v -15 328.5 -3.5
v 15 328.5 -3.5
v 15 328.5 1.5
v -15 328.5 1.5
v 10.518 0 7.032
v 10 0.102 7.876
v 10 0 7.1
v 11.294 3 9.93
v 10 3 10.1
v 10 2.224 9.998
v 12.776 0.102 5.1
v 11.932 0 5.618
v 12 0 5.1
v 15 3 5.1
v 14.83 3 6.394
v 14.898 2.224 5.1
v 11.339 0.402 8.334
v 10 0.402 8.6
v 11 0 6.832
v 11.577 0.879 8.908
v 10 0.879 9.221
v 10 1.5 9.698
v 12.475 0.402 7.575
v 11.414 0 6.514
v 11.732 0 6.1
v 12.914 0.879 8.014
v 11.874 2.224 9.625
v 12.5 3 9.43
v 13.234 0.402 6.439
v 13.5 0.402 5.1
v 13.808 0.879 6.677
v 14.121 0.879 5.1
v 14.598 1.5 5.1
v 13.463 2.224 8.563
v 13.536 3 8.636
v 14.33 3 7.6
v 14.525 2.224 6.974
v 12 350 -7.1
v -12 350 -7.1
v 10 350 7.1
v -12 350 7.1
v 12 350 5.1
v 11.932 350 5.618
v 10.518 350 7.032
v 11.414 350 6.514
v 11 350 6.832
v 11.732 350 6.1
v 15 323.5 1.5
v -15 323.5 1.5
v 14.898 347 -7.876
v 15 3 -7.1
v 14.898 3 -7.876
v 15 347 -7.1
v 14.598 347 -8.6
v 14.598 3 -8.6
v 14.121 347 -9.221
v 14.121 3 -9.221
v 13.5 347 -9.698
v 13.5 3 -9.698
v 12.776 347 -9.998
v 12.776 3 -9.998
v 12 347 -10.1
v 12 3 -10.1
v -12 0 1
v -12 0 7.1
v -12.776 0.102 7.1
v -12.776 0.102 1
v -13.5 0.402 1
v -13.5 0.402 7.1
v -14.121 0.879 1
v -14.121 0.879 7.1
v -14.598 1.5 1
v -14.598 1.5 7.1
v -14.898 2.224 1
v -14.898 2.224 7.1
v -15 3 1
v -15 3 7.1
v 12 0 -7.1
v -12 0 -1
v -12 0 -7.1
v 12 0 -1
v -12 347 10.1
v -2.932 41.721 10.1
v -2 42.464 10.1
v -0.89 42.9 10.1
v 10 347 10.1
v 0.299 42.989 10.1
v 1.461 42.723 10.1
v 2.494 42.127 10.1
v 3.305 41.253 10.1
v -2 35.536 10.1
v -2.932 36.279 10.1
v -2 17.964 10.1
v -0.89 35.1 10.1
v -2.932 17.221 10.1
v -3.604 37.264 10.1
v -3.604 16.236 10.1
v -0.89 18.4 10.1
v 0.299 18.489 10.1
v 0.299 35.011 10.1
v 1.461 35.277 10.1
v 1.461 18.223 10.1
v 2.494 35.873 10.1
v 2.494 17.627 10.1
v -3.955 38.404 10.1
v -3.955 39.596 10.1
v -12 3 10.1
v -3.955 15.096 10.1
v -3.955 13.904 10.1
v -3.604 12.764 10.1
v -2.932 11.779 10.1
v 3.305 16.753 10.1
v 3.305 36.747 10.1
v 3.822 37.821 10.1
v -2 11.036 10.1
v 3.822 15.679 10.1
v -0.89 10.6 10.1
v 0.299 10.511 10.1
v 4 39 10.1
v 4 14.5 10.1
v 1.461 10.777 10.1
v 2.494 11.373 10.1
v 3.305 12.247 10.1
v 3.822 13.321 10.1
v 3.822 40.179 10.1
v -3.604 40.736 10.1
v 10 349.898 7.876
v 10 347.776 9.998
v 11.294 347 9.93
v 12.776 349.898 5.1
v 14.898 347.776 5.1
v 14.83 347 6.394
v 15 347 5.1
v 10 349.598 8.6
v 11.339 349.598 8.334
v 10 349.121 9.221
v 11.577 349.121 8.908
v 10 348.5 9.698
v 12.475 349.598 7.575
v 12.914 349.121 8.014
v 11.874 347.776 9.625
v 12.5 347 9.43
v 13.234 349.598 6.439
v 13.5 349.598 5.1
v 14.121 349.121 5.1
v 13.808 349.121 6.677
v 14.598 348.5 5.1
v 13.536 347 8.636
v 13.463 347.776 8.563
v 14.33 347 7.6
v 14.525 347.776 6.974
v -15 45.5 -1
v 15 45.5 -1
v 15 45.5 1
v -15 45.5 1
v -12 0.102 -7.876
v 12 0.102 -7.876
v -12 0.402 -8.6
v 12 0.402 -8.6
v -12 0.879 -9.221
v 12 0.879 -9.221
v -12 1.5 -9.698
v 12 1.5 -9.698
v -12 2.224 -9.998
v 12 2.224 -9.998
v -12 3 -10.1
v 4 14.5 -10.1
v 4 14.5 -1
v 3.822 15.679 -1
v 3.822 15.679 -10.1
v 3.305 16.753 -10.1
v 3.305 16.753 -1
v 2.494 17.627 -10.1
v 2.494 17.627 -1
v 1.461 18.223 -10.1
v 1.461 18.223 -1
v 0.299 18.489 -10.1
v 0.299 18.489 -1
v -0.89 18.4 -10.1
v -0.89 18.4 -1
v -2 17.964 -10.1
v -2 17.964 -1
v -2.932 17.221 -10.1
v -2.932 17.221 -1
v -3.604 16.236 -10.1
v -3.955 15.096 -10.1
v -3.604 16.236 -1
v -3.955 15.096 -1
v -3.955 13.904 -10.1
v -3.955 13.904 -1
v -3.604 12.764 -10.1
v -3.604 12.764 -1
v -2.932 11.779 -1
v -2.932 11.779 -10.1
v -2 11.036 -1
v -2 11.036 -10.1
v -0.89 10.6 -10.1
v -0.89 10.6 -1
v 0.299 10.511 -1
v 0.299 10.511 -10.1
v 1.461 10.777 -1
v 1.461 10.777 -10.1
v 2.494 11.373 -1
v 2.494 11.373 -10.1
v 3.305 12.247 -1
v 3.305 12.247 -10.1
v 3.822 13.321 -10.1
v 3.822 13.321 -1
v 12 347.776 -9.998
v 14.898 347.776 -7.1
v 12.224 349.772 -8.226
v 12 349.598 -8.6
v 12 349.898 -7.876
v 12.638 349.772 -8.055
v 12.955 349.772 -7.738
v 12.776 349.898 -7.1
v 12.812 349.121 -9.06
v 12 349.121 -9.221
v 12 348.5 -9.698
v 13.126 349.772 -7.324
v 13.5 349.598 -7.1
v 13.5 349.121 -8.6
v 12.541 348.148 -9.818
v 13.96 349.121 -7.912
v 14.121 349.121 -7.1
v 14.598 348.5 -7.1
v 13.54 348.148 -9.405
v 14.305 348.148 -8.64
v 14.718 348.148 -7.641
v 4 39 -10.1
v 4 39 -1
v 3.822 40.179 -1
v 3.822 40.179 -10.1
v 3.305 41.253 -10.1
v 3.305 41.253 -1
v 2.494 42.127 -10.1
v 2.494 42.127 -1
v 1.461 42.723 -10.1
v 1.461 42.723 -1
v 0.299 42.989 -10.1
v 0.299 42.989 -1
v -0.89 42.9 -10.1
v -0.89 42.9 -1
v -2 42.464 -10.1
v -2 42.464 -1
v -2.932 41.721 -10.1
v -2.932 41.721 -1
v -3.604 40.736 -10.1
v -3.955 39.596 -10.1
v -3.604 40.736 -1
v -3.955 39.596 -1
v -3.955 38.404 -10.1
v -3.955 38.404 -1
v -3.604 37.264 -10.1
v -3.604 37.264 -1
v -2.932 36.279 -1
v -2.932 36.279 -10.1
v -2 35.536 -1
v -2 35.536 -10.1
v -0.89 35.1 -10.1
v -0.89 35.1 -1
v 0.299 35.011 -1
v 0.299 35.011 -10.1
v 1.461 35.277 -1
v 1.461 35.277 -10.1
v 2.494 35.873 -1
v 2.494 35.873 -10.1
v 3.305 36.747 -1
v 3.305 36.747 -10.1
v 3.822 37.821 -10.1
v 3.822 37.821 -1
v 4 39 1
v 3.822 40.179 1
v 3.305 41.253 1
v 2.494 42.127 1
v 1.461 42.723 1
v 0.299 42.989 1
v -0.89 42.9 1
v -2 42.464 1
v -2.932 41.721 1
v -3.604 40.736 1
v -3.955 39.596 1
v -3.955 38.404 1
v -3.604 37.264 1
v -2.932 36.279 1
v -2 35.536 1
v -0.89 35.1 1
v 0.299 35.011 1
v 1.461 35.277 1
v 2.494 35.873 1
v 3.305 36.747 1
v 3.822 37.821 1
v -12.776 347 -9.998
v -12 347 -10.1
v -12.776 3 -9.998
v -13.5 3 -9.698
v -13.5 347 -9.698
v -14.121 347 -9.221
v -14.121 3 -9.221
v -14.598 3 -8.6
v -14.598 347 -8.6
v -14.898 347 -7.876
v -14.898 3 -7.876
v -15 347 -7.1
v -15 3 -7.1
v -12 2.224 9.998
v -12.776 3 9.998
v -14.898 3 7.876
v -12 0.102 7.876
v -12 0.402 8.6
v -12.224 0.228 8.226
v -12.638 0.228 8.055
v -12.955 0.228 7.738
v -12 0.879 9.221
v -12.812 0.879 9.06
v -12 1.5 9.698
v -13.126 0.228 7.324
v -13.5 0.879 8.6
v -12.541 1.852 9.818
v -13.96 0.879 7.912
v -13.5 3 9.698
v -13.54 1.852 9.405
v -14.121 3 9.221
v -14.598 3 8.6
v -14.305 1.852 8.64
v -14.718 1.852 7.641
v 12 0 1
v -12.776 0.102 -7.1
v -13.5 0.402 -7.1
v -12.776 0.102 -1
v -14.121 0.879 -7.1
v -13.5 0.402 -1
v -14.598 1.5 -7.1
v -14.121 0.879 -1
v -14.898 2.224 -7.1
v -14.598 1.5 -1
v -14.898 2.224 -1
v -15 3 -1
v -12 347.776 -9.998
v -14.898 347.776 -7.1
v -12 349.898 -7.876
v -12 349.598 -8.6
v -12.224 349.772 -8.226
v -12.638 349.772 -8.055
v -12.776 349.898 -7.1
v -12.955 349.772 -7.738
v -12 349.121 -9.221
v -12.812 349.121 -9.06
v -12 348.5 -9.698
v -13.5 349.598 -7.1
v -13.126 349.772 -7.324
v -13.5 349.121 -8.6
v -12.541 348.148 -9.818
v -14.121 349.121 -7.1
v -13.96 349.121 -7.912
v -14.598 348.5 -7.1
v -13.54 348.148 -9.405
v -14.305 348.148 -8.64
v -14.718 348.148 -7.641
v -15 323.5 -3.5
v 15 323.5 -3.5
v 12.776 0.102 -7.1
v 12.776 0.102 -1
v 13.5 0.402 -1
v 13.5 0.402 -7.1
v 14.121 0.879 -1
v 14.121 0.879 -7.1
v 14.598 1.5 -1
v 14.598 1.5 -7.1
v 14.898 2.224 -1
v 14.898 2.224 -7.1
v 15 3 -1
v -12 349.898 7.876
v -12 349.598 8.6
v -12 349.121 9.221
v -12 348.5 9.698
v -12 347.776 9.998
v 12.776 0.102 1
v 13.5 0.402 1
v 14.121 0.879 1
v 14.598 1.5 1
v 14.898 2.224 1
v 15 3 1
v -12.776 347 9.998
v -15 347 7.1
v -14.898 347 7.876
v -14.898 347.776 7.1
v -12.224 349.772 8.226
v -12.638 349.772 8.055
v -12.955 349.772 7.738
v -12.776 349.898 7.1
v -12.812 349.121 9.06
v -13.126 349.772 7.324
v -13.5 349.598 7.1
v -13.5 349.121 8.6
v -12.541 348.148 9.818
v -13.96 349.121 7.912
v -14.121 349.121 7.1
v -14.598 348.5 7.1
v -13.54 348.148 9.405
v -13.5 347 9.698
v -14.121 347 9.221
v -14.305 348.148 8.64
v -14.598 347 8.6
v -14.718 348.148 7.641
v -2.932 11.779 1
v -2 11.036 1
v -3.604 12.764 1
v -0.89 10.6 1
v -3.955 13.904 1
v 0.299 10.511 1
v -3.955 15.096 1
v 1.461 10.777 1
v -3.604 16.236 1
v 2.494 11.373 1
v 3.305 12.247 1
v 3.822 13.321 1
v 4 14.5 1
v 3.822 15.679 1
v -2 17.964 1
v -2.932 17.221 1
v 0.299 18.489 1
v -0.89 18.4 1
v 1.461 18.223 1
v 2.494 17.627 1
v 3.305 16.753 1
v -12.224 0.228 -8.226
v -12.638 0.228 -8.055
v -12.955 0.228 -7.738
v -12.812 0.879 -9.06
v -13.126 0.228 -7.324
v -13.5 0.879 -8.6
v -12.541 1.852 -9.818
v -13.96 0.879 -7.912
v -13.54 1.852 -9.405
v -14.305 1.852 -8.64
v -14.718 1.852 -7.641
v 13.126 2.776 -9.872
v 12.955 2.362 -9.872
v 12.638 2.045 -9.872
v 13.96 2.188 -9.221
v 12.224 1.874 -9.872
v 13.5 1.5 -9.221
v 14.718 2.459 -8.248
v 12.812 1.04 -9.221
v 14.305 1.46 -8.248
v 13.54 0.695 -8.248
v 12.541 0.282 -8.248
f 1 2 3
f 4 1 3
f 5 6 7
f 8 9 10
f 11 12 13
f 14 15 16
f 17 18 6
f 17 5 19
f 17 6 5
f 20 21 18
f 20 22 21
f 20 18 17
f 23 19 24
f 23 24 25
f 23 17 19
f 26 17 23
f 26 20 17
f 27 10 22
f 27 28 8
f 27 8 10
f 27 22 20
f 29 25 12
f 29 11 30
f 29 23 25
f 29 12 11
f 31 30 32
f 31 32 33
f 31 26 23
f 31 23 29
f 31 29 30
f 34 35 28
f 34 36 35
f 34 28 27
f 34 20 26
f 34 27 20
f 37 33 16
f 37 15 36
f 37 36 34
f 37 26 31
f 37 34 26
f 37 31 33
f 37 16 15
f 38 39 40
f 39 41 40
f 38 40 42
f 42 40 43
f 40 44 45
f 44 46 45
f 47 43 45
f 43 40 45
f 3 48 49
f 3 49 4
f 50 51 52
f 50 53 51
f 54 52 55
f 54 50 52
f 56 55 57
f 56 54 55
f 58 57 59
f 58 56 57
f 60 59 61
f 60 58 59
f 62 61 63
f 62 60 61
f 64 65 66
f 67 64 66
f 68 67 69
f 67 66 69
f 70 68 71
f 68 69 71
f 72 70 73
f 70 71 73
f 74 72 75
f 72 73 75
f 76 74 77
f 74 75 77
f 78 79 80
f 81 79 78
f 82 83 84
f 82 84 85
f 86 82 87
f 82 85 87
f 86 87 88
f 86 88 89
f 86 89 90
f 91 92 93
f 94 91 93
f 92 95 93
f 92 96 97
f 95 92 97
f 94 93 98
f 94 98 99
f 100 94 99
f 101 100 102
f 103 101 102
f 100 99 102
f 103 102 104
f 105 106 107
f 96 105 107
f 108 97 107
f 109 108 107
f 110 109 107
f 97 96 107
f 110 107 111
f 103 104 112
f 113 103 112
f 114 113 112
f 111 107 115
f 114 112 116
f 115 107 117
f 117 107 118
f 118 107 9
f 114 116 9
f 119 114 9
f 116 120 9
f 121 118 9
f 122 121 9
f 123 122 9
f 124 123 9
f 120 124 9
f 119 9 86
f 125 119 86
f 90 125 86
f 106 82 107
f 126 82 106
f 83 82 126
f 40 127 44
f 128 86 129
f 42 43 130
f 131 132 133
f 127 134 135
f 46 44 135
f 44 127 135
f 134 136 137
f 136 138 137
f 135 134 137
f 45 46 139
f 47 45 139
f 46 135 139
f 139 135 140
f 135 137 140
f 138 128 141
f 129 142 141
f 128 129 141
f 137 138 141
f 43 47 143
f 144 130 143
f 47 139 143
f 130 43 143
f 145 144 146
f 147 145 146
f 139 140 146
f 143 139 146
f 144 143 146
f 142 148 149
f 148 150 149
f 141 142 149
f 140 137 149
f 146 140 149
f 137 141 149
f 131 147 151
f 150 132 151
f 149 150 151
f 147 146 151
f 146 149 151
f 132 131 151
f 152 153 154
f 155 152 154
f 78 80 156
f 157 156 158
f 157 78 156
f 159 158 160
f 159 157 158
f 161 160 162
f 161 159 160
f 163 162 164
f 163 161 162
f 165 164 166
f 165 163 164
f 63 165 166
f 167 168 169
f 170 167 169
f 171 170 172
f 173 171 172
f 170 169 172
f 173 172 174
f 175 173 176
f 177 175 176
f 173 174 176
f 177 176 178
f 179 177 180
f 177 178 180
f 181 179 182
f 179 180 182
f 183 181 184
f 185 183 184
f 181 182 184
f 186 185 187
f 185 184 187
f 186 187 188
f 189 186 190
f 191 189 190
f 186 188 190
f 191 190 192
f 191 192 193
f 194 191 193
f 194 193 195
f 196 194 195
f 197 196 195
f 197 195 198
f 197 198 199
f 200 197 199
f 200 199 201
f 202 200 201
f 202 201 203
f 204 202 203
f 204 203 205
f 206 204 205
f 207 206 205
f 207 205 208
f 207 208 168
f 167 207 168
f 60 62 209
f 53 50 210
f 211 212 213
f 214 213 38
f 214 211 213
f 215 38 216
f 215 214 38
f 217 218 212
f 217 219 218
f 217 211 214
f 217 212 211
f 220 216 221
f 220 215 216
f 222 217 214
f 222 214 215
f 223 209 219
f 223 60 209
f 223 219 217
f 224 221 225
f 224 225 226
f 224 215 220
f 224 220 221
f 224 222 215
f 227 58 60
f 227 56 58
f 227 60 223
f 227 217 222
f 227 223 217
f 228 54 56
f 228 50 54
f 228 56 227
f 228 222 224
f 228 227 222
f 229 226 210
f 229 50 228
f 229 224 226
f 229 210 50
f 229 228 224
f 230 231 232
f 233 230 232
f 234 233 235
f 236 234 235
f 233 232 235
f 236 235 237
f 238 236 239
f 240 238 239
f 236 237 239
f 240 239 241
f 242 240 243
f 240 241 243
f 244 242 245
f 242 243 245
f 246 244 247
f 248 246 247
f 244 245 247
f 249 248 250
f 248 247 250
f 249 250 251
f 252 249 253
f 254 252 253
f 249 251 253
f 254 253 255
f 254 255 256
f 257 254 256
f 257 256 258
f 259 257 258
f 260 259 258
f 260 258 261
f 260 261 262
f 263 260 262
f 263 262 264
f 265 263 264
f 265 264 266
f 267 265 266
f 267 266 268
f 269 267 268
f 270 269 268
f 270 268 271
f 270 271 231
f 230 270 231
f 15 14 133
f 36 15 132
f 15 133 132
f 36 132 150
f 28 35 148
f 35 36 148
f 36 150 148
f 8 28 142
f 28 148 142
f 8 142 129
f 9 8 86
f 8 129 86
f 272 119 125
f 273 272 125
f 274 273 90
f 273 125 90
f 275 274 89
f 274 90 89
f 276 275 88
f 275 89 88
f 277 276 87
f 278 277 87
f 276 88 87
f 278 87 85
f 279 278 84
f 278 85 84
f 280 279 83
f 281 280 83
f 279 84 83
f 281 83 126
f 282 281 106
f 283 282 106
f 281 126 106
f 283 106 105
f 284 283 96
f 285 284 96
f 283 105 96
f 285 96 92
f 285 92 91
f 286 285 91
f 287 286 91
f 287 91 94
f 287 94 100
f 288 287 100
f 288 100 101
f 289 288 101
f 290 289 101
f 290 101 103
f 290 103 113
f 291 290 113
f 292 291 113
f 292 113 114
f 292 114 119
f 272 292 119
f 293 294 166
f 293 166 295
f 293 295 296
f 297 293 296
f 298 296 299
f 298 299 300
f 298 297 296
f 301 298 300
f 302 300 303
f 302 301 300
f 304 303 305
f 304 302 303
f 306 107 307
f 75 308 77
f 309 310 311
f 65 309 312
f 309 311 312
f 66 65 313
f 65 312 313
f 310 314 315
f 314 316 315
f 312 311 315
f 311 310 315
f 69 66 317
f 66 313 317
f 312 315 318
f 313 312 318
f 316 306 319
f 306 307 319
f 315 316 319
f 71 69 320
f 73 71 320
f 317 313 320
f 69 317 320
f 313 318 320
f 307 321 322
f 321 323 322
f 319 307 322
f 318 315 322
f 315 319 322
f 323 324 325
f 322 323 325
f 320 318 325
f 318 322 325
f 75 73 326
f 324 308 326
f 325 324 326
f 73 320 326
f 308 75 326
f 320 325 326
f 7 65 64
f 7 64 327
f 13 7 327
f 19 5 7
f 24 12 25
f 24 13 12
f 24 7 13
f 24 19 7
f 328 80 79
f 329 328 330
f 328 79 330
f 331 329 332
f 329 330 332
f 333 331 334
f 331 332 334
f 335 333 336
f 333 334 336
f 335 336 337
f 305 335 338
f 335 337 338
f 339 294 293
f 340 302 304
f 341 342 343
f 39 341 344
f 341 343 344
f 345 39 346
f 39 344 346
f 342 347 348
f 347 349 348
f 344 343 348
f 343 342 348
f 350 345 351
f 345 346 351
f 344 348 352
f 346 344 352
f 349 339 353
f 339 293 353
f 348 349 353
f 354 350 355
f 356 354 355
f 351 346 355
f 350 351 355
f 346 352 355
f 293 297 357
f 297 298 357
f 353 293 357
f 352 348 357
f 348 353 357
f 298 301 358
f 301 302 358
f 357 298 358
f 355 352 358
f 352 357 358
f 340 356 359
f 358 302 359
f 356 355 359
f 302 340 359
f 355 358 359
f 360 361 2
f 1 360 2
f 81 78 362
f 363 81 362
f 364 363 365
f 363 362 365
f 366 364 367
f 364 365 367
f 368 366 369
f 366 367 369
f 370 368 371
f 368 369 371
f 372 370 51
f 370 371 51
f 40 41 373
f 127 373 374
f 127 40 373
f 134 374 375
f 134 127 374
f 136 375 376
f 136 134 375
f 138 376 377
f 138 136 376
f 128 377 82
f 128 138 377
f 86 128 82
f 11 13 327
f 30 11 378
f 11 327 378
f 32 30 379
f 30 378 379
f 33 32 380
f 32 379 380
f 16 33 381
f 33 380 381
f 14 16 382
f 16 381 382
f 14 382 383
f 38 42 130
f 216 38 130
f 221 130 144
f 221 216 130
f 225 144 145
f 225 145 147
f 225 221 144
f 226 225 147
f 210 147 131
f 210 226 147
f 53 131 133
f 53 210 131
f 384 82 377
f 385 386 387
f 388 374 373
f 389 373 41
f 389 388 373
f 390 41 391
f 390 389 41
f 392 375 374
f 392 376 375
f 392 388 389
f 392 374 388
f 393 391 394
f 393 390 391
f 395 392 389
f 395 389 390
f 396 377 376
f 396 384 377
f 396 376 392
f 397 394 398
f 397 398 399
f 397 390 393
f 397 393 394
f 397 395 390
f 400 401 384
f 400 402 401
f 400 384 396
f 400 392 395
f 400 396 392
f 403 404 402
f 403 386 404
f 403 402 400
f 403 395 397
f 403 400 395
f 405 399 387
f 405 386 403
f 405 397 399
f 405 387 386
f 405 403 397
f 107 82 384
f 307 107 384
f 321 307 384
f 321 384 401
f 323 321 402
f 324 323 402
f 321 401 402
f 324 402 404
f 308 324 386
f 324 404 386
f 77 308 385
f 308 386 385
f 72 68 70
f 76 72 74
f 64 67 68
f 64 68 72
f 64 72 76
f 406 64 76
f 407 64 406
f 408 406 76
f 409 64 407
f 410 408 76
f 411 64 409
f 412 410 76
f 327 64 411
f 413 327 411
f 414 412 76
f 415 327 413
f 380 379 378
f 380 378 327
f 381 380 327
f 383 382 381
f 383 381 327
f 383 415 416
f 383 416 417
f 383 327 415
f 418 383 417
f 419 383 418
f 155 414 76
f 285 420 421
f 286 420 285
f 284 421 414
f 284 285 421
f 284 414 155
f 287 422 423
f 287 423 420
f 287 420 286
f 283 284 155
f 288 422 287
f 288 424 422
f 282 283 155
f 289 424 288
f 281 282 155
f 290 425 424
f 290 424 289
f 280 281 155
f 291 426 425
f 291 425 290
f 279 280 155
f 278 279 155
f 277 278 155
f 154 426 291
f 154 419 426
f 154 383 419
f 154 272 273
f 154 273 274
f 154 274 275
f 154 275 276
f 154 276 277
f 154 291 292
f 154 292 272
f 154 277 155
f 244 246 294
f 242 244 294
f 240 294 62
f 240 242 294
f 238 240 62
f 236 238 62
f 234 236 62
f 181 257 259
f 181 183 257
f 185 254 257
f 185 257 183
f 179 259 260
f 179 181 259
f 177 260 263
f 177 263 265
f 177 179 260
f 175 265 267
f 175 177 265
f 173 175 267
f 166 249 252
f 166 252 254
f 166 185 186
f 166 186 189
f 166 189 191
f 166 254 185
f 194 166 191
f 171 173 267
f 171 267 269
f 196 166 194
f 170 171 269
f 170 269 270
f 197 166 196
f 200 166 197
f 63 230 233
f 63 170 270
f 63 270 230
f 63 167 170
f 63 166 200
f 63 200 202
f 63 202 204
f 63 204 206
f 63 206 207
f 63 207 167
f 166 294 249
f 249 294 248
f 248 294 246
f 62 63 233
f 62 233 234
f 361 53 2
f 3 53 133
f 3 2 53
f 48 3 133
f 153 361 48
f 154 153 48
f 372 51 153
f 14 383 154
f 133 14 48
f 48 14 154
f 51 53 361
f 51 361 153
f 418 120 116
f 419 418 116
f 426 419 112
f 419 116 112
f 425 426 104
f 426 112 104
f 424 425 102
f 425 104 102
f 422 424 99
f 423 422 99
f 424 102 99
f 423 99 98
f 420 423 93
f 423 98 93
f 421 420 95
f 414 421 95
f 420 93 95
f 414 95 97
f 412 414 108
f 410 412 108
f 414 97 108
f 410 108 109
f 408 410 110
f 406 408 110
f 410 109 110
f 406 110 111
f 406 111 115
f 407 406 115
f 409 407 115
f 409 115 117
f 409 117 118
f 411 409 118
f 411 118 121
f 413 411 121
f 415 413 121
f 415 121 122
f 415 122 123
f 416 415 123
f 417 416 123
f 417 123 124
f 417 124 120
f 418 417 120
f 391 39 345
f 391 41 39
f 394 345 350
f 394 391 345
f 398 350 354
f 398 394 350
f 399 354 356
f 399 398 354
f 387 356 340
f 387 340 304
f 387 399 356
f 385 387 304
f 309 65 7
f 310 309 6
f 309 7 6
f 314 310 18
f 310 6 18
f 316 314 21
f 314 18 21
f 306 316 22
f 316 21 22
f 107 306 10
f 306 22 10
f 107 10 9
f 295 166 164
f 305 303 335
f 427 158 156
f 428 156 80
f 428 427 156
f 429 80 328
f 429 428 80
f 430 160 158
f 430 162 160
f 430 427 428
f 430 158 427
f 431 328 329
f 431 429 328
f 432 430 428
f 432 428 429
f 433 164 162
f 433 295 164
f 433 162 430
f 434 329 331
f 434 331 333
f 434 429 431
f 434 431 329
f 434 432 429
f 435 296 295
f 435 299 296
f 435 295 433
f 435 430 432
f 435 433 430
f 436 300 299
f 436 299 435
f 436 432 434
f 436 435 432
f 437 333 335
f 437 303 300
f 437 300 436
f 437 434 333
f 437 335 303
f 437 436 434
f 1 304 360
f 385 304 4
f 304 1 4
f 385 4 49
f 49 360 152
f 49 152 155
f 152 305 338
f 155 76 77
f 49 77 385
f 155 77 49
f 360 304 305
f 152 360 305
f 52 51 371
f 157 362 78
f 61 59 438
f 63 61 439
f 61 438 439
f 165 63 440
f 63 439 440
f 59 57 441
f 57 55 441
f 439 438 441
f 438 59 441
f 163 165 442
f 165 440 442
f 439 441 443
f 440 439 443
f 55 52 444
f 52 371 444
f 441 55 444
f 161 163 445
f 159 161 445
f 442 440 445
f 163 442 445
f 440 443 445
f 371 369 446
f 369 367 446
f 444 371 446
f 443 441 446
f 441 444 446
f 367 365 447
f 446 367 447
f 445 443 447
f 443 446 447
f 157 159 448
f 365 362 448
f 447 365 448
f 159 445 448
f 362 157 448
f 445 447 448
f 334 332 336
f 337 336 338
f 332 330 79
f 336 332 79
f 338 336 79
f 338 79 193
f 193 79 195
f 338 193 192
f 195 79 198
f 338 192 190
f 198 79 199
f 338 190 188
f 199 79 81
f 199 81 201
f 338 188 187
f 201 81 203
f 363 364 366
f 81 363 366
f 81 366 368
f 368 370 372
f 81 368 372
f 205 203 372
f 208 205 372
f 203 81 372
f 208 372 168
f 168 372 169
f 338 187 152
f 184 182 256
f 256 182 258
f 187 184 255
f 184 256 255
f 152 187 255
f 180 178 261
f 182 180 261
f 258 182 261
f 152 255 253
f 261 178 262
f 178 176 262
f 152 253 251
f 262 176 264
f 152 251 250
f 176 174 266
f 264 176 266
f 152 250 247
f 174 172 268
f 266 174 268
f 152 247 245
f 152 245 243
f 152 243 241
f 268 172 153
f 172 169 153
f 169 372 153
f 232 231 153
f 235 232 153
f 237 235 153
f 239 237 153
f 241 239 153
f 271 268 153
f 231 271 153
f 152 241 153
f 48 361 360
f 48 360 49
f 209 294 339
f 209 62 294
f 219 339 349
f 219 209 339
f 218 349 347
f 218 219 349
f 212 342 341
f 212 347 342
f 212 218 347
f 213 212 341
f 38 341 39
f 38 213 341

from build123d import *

# Parameters (mm, degrees)
F0_W      = 30
F0_H      = 20.2
F1_DEPTH  = 350
F2_R      = 5
F3_R      = 3
F4_W      = 45.5
F4_H      = 2
F5_DEPTH  = 30.001
F6_W      = 5
F6_H      = 5
F7_DEPTH  = 30.001
F8_R      = 4
F9_DEPTH  = 20.201
F10_DEPTH = 30.001


with BuildPart() as f1:
    # F0 (on Front) → F1 (new body)
    with BuildSketch(Plane.XZ):
        Rectangle(F0_W, F0_H)
    extrude(amount=-F1_DEPTH)

    # F2
    f2_edges = [f1.edges().sort_by_distance(p)[0] for p in [
        (15, 175, 10.1),
    ]]
    fillet(f2_edges, radius=F2_R)

    # F3
    f3_edges = [f1.edges().sort_by_distance(p)[0] for p in [
        (-15, 175, 10.1),
        (-2.5, 0, 10.1),
        (-15, 175, -10.1),
        (15, 175, -10.1),
        (0, 0, -10.1),
        (0, 350, -10.1),
        (-15, 0, 0),
        (-2.5, 350, 10.1),
        (-15, 350, 0),
    ]]
    fillet(f3_edges, radius=F3_R)

    # F4 (on face) → F5 (cut, through all)
    with BuildSketch(Plane.YZ.offset(15)):
        with Locations((22.75, 0)):
            Rectangle(F4_W, F4_H)
    extrude(amount=-F5_DEPTH, mode=Mode.SUBTRACT)

    # F6 (on face) → F7 (cut, through all)
    with BuildSketch(Plane.YZ.offset(15)):
        with Locations((326, -1)):
            Rectangle(F6_W, F6_H)
    extrude(amount=-F7_DEPTH, mode=Mode.SUBTRACT)

    # F8 (on face) → F9 (cut, through all)
    with BuildSketch(Plane.XY.offset(10.1)):
        with Locations((0, 14.5)):
            Circle(F8_R)
        with Locations((0, 39)):
            Circle(F8_R)
    extrude(amount=-F9_DEPTH, mode=Mode.SUBTRACT)

    # F6 (on face) → F10 (cut, through all)
    with BuildSketch(Plane.YZ.offset(15)):
        with Locations((326, -1)):
            Rectangle(F6_W, F6_H)
    extrude(amount=-F10_DEPTH, mode=Mode.SUBTRACT)


solid = f1.part
